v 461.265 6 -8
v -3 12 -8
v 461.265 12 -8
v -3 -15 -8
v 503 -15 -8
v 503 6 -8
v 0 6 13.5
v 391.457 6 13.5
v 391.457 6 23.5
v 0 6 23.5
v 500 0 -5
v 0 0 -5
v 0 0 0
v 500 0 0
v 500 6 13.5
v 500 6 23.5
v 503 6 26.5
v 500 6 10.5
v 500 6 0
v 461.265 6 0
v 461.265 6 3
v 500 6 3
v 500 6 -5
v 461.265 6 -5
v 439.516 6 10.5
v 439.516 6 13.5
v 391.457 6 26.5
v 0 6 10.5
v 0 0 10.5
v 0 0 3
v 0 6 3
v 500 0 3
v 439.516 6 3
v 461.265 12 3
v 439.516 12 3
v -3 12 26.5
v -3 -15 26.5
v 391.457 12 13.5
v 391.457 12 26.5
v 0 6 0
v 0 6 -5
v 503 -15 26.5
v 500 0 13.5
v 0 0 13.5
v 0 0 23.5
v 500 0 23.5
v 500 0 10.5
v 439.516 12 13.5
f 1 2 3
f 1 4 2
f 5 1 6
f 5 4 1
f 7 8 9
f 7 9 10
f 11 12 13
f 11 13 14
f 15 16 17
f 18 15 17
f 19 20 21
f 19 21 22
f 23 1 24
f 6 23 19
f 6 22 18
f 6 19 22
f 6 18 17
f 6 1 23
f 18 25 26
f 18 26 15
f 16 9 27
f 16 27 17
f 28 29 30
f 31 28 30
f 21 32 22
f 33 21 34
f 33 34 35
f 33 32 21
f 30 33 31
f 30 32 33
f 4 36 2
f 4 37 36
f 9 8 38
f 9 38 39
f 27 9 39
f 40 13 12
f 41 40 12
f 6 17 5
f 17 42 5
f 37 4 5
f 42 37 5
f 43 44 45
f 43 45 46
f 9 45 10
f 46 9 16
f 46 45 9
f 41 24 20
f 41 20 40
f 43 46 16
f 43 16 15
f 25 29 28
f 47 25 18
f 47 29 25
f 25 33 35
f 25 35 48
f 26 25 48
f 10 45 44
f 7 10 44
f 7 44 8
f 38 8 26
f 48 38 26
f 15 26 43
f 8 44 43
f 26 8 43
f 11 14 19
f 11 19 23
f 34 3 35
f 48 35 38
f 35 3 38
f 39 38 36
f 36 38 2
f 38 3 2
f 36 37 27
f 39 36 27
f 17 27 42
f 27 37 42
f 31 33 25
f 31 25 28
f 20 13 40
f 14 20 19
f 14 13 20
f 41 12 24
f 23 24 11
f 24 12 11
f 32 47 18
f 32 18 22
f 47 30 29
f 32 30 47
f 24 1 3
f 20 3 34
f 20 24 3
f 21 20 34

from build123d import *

# Parameters (mm, degrees)
SKETCH1_W           = 506
SKETCH1_H           = 34.5
BOSS_EXTRUDE1_DEPTH = 15
SKETCH3_W           = 506
SKETCH3_H           = 34.5
SKETCH3_W_2         = 500
SKETCH3_H_2         = 10
SKETCH3_H_3         = 5
SKETCH3_H_4         = 7.5
BOSS_EXTRUDE2_DEPTH = 6
BOSS_EXTRUDE3_DEPTH = 6


with BuildPart() as part:
    # Sketch1 → Boss-Extrude1 (new body)
    with BuildSketch(Plane(origin=(0, 0, 0), x_dir=(1, 0, 0), z_dir=(0, 1, 0))):
        with Locations((250, -9.25)):
            Rectangle(SKETCH1_W, SKETCH1_H)
    extrude(amount=-BOSS_EXTRUDE1_DEPTH)

    # Sketch3 → Boss-Extrude2 (add)
    with BuildSketch(Plane(origin=(0, 0, 0), x_dir=(1, 0, 0), z_dir=(0, 1, 0))):
        with Locations((250, -9.25)):
            Rectangle(SKETCH3_W, SKETCH3_H)
        with Locations((250, -18.5)):
            Rectangle(SKETCH3_W_2, SKETCH3_H_2, mode=Mode.SUBTRACT)
        with Locations((250, 2.5)):
            Rectangle(SKETCH3_W_2, SKETCH3_H_3, mode=Mode.SUBTRACT)
        with Locations((250, -6.75)):
            Rectangle(SKETCH3_W_2, SKETCH3_H_4, mode=Mode.SUBTRACT)
    extrude(amount=BOSS_EXTRUDE2_DEPTH)

    # Sketch4 → Boss-Extrude3 (add)
    with BuildSketch(Plane(origin=(0, 6, 0), x_dir=(1, 0, 0), z_dir=(0, 1, 0))):
        Polygon((461.264937975, 8), (461.264937975, -3), (439.515598099, -3), (439.515598099, -13.5), (391.45657289, -13.5), (391.45657289, -26.5), (-3, -26.5), (-3, 8), align=None)
    extrude(amount=BOSS_EXTRUDE3_DEPTH)


solid = part.part
